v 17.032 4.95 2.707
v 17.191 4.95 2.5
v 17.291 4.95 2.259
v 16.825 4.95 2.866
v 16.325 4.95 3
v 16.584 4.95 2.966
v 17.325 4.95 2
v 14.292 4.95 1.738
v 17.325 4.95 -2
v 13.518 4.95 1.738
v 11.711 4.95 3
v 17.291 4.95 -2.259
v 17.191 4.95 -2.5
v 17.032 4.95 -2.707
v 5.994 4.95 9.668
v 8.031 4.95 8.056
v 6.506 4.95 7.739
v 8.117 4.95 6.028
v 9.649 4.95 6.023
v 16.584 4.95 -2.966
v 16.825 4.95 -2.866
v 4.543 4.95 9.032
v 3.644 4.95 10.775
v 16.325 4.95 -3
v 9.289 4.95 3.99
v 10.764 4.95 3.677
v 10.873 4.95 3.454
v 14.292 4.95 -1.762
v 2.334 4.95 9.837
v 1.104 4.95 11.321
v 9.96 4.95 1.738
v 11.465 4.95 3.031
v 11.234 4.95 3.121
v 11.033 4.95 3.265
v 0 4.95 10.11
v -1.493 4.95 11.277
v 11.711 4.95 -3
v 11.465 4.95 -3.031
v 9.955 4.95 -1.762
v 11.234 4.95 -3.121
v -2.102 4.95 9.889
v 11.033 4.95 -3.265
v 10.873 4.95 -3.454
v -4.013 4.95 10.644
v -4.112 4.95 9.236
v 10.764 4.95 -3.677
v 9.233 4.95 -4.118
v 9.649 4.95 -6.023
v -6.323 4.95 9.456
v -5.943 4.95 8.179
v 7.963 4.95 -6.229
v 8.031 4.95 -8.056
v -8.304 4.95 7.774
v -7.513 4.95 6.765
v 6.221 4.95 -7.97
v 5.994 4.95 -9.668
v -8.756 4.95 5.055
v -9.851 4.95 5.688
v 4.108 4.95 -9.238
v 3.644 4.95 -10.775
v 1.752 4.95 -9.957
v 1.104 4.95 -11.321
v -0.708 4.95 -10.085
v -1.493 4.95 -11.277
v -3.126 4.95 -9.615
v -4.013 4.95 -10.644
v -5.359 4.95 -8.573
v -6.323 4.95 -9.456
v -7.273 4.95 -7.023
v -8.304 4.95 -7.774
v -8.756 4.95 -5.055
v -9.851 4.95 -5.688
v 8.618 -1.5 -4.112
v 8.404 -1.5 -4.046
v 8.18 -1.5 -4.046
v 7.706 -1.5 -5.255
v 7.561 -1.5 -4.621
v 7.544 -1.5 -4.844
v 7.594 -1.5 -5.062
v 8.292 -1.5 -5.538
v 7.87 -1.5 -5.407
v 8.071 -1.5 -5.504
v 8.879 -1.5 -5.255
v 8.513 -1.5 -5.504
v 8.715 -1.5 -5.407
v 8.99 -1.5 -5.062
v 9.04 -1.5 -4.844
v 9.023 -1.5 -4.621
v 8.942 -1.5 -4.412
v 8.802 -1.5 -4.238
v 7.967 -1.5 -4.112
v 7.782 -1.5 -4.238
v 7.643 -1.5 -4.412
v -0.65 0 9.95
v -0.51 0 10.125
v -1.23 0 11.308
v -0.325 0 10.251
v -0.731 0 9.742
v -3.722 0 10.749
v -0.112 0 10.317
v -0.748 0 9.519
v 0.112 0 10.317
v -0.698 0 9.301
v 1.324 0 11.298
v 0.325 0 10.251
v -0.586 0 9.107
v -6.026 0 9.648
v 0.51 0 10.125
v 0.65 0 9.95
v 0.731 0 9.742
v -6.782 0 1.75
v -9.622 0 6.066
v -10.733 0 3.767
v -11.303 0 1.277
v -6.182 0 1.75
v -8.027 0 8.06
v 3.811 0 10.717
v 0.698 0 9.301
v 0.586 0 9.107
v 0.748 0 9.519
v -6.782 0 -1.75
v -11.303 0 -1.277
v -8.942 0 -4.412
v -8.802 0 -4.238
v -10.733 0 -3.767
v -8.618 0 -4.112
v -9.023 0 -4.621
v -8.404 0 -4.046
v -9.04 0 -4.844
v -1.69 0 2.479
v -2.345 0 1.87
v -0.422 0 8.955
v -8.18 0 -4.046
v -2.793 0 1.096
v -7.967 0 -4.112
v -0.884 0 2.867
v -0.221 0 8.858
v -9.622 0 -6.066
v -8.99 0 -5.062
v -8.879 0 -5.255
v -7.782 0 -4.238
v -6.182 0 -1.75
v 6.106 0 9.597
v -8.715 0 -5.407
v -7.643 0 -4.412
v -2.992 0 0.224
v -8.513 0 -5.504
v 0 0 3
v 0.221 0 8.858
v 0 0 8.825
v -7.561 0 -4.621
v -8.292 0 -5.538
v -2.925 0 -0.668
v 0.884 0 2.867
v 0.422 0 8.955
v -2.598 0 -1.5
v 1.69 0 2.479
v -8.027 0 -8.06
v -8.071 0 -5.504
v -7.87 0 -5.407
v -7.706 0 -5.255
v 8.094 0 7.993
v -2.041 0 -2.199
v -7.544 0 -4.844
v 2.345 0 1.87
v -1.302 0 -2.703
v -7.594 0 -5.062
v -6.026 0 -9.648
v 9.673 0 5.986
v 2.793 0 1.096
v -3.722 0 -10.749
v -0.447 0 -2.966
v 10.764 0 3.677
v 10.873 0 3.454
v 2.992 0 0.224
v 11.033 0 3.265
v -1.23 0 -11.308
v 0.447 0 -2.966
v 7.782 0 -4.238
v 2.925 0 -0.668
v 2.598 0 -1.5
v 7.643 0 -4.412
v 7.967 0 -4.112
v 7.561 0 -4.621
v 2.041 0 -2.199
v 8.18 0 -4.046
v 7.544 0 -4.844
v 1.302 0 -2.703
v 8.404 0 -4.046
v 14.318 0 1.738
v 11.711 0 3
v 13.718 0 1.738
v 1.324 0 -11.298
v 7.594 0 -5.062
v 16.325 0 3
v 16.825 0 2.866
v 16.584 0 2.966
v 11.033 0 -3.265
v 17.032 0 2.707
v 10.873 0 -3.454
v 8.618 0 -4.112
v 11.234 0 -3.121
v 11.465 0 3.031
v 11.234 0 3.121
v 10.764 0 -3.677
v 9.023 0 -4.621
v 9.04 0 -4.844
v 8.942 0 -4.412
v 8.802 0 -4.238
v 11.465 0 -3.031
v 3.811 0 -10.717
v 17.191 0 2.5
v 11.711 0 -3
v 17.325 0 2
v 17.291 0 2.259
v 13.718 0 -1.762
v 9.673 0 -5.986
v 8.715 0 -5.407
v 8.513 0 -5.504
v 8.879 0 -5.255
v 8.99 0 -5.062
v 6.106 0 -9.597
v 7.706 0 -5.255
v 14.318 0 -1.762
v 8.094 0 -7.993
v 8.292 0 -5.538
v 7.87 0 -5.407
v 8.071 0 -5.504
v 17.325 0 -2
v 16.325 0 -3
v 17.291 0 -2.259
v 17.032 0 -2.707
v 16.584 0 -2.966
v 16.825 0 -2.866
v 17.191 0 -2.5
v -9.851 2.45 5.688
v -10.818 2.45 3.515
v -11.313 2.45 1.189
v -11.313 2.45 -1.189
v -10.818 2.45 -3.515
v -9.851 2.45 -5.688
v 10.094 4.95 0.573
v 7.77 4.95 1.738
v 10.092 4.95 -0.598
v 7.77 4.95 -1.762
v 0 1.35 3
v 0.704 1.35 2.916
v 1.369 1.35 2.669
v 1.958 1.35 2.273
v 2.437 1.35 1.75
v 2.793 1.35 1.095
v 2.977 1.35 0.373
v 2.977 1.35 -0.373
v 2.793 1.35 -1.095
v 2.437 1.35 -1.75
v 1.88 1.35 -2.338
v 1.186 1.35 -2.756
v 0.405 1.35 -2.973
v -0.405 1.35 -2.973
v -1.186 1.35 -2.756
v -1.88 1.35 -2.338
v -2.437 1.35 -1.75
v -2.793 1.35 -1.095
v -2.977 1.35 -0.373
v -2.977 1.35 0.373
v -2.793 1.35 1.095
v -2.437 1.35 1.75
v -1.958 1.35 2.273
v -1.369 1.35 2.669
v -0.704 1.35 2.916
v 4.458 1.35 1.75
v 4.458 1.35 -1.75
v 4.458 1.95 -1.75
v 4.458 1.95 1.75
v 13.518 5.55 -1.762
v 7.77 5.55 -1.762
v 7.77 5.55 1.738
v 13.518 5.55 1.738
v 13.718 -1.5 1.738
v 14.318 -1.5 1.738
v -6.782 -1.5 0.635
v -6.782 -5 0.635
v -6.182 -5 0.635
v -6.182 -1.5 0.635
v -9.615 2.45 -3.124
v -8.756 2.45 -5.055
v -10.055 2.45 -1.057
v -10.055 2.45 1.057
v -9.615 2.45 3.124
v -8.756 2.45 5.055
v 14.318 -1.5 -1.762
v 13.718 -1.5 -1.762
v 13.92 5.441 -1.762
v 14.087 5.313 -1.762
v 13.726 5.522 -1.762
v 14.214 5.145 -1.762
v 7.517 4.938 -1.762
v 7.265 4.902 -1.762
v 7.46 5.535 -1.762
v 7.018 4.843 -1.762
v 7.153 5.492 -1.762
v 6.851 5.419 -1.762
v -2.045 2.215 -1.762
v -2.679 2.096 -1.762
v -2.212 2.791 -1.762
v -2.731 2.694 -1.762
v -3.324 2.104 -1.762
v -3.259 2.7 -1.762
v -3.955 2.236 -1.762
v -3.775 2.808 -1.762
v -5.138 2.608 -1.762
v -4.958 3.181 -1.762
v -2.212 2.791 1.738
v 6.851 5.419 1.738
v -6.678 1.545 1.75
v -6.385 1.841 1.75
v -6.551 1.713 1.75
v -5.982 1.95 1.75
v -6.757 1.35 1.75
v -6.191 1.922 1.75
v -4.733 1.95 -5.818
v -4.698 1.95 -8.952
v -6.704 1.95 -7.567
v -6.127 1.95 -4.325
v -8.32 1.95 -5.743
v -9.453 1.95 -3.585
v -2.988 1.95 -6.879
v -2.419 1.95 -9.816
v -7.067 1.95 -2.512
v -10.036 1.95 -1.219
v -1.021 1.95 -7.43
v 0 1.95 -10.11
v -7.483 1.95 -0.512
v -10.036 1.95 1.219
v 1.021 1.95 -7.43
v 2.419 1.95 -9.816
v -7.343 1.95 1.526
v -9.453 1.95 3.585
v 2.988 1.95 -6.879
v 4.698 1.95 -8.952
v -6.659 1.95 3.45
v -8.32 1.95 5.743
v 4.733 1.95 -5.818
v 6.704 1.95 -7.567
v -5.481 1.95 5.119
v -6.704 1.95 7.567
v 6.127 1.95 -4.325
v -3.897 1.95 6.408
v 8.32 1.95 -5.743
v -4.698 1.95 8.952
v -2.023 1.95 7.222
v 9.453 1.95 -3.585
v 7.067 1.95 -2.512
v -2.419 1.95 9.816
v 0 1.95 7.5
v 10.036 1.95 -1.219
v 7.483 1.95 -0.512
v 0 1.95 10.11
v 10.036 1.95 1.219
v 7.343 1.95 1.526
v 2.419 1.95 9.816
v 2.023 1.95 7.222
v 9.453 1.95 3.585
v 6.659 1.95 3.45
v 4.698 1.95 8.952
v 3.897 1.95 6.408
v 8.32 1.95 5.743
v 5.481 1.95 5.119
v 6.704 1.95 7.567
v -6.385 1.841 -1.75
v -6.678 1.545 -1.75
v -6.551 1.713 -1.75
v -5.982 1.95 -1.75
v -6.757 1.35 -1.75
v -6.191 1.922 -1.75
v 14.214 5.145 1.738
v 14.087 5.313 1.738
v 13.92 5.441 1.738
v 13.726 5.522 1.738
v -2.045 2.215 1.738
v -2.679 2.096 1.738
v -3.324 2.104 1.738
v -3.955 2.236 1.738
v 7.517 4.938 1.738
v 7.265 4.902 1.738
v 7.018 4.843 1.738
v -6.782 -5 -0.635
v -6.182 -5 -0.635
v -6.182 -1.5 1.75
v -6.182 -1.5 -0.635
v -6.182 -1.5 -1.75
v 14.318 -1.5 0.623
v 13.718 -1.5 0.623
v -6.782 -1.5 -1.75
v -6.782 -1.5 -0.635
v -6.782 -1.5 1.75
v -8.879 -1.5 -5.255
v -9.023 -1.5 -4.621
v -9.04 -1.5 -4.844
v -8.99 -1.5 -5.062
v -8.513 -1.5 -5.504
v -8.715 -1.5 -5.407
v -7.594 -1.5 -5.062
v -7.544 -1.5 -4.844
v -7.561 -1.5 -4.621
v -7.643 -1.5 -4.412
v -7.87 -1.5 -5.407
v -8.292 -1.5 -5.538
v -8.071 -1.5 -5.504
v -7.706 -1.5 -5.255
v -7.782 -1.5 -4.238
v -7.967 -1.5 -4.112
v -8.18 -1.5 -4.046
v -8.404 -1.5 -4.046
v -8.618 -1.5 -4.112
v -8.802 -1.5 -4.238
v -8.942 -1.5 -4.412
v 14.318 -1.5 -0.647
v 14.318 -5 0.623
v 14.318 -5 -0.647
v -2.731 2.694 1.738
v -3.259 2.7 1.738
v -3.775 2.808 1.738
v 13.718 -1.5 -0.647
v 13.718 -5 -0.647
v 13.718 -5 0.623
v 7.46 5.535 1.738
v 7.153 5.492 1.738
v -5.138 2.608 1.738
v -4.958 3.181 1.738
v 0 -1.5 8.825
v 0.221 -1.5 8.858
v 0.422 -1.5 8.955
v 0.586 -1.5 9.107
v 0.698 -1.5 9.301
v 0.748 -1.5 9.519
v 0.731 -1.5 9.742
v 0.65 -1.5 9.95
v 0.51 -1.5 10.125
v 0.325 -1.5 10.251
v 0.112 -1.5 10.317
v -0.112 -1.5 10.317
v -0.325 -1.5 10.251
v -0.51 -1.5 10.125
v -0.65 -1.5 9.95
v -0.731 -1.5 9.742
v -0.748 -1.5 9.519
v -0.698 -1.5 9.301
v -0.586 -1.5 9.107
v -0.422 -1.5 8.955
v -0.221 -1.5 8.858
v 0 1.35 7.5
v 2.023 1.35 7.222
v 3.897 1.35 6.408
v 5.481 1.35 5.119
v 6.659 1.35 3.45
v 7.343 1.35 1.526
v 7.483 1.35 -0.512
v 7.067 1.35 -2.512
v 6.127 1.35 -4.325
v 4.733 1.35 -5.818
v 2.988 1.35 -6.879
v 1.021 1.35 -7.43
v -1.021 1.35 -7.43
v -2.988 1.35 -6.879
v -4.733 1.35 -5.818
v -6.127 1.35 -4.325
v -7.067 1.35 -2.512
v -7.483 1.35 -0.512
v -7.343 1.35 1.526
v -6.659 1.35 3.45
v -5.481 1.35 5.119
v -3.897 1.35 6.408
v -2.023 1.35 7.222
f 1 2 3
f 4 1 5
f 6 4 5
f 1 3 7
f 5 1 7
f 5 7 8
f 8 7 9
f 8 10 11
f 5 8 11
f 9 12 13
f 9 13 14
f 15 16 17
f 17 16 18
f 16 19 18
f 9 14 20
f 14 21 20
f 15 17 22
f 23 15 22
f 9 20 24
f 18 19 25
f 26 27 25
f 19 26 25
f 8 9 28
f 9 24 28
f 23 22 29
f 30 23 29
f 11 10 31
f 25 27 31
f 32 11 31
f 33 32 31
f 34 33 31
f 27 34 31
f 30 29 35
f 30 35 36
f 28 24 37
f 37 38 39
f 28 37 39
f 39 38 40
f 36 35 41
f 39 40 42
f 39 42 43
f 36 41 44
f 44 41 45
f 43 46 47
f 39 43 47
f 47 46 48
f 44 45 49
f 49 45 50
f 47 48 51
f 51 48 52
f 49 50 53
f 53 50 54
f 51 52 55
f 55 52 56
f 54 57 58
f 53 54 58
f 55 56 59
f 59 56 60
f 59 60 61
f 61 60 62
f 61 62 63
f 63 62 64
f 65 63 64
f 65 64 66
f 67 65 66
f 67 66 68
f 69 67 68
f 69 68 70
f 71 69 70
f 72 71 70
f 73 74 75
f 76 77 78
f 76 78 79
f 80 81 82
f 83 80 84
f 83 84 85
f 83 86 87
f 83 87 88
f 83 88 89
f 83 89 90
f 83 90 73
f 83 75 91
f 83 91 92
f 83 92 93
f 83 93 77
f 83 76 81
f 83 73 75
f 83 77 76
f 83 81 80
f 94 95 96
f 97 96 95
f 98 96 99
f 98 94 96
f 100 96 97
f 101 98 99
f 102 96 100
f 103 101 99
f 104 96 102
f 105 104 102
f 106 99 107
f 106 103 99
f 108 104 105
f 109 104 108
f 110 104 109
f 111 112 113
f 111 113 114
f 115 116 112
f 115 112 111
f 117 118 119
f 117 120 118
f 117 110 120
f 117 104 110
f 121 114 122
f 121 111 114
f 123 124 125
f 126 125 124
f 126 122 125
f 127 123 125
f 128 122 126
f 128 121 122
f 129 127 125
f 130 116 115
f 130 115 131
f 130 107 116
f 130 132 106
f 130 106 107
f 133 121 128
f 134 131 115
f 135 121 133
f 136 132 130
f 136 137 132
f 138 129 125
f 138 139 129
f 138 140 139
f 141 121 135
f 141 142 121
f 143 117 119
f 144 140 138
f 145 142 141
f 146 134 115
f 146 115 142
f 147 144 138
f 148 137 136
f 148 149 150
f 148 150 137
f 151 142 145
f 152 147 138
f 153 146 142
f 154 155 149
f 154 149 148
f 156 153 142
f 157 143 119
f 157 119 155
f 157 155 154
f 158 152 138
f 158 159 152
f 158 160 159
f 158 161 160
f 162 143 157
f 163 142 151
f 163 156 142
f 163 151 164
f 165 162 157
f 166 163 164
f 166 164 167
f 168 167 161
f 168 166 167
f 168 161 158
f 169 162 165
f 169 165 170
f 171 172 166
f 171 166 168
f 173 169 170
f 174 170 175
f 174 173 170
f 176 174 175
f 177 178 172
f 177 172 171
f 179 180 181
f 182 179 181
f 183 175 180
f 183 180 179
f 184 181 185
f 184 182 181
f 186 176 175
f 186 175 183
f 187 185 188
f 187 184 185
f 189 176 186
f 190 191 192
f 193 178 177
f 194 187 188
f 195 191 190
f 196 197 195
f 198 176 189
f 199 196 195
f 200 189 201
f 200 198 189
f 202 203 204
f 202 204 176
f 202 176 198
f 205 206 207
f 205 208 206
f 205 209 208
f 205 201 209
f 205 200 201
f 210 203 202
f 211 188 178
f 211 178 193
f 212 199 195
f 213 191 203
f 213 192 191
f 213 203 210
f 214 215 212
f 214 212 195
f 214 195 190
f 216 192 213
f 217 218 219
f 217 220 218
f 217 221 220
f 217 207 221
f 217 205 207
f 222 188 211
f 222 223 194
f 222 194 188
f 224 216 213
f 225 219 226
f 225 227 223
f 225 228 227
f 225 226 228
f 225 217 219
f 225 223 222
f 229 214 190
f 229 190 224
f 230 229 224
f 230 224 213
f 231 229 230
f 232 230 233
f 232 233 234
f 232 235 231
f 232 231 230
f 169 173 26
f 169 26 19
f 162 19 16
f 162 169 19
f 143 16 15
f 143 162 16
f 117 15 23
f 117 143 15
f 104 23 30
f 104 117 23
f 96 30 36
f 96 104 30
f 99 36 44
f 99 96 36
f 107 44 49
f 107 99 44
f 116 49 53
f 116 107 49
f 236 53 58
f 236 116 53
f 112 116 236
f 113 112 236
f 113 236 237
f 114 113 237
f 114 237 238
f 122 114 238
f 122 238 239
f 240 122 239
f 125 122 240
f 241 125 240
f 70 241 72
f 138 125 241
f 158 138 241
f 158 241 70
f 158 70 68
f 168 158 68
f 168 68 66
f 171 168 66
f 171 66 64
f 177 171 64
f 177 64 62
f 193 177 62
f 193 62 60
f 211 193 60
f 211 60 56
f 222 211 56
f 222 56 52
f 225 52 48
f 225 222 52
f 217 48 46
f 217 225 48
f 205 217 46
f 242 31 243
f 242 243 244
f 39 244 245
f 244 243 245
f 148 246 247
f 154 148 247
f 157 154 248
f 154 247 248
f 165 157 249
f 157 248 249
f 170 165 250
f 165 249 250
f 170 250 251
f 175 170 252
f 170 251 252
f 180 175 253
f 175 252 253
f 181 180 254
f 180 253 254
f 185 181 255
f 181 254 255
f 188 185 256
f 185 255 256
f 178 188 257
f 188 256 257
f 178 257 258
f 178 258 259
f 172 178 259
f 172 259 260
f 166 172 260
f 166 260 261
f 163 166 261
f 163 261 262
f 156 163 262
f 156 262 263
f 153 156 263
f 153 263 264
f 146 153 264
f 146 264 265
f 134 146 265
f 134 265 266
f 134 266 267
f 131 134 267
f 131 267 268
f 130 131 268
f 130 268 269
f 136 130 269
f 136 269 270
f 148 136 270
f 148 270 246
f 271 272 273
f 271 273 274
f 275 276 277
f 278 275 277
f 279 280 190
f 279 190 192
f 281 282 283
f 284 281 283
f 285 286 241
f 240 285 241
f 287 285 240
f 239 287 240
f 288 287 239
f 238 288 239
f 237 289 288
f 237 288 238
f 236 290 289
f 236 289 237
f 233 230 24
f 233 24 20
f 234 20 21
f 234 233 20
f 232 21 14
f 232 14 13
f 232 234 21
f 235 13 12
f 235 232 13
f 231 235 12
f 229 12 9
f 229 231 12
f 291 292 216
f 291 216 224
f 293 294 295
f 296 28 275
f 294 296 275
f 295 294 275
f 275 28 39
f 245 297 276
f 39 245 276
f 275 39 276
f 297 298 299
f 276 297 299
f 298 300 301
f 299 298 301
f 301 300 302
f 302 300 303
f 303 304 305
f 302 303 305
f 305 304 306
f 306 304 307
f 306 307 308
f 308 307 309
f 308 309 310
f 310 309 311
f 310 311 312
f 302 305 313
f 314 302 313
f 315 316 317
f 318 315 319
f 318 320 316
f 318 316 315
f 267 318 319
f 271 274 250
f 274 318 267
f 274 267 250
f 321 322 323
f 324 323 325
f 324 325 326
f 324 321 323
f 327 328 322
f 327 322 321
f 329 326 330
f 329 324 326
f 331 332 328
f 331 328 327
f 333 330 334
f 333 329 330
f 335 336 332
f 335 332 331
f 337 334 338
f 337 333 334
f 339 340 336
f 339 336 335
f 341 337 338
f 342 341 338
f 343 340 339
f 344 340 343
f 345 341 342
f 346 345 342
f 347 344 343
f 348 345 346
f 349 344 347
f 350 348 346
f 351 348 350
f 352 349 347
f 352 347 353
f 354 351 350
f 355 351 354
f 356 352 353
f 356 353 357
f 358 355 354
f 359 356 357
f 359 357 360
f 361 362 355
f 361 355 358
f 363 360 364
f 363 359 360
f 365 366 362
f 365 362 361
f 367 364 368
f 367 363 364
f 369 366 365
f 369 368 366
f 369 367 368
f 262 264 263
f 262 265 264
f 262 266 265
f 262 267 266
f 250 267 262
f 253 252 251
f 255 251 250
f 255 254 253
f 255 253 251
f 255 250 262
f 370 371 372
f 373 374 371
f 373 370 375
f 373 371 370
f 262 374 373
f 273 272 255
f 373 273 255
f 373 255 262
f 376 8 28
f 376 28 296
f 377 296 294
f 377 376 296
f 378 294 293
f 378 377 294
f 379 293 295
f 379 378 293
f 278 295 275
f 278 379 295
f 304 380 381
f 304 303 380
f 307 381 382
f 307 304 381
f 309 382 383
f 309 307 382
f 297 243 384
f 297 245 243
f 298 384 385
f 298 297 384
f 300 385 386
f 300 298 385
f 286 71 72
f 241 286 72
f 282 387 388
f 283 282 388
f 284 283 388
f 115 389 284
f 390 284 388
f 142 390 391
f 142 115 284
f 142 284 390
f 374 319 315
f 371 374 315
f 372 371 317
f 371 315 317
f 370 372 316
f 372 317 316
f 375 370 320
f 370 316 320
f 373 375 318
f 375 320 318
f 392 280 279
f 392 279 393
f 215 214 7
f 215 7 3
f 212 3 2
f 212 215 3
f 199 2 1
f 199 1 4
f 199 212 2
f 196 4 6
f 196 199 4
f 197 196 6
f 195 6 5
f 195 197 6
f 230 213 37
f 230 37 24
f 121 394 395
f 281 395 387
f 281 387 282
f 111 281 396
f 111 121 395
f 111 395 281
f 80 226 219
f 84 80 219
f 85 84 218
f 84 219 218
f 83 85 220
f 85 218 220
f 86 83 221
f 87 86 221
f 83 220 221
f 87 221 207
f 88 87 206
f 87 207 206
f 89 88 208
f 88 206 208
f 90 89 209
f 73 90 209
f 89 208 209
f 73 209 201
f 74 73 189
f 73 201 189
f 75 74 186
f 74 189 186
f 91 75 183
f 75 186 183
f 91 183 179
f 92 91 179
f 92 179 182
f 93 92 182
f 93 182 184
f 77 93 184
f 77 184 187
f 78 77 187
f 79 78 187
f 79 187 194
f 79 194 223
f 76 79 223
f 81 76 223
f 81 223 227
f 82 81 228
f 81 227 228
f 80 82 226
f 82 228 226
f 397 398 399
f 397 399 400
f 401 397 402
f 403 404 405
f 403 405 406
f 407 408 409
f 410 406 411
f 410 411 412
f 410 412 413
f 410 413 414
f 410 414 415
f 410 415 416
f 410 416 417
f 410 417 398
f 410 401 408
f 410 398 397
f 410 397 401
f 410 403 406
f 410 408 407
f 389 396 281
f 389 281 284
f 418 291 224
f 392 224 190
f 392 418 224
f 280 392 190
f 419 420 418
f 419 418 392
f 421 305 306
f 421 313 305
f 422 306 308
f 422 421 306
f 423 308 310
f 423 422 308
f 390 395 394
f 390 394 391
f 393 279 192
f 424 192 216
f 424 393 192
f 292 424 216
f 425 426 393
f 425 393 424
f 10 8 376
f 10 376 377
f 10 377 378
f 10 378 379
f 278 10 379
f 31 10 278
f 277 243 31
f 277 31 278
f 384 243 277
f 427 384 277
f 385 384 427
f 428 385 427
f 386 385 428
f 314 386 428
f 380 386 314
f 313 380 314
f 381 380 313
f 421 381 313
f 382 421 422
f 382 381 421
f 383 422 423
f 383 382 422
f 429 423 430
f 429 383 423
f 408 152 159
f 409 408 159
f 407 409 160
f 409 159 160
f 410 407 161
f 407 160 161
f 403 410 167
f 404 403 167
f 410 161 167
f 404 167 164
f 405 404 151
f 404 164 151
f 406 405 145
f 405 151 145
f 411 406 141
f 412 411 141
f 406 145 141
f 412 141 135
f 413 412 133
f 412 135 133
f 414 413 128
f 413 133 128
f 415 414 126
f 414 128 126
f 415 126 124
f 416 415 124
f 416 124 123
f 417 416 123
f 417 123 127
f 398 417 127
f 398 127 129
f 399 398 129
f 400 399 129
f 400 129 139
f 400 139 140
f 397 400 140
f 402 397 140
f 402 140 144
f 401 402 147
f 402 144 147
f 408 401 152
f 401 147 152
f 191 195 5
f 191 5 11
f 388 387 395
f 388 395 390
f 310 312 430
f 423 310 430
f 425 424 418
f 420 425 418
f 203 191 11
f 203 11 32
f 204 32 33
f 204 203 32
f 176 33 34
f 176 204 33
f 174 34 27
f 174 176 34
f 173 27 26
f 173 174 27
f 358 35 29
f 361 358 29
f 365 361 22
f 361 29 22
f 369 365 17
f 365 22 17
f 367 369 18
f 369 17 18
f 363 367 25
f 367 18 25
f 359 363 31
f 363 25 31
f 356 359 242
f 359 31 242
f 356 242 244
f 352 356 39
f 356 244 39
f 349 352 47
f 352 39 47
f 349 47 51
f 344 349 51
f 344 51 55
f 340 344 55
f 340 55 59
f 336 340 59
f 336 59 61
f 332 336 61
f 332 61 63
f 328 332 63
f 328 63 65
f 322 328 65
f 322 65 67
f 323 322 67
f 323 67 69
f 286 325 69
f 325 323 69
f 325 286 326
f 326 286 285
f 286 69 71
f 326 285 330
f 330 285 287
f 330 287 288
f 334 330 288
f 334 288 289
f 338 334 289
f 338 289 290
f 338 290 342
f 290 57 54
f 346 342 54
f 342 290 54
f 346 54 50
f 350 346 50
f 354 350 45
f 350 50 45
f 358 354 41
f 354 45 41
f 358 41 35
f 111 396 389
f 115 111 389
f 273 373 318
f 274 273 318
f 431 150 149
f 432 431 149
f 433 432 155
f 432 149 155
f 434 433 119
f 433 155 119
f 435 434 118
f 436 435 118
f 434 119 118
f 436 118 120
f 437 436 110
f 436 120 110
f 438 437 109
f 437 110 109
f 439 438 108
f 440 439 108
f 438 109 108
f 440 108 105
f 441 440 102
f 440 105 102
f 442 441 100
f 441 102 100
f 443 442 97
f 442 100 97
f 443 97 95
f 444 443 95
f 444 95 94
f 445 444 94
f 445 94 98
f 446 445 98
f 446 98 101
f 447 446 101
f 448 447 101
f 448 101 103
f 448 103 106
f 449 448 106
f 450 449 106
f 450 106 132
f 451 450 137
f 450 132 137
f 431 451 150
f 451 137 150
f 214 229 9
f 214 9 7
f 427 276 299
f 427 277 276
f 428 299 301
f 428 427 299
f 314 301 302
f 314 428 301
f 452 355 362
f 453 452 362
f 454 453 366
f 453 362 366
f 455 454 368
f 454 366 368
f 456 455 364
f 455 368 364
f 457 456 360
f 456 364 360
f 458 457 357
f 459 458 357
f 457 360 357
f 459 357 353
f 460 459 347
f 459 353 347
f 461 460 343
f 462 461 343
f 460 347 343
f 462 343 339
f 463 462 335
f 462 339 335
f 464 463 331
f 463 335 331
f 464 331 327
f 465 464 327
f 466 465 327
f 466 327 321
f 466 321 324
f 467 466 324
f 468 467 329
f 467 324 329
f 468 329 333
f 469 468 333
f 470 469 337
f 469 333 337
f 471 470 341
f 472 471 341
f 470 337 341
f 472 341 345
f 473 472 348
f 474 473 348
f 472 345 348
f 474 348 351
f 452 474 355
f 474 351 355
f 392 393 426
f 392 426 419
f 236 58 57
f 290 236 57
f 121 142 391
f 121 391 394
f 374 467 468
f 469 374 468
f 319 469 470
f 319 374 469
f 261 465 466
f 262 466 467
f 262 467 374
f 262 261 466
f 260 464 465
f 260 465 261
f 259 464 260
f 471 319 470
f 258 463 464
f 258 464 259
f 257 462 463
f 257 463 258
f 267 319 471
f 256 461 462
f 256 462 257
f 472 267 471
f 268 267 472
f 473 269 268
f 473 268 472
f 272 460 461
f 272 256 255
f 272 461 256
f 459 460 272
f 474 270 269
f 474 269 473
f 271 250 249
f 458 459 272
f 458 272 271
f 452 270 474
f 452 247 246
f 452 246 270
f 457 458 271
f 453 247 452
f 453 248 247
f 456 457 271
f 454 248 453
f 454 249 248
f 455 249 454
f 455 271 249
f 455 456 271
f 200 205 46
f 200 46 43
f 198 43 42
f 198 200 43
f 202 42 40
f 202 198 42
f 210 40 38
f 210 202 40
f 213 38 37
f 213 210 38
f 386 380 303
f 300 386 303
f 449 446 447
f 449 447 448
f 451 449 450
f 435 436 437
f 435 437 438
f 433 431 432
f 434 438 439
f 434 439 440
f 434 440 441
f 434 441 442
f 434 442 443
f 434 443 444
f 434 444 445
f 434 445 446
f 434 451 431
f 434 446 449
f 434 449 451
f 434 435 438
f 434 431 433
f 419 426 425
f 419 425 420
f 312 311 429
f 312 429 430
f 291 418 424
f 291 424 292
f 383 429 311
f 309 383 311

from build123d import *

# Parameters (mm, degrees)
EXTRUDE_1_DEPTH     = 4.95
SKETCH_2_R          = 10.11
CUT_EXTRUDE_1_DEPTH = 3
CUT_EXTRUDE_2_DEPTH = 2.5
SKETCH_4_R          = 7.5
CUT_EXTRUDE_3_DEPTH = 0.6
CUT_EXTRUDE_4_REACH = 23.036
SKETCH_5_R          = 3
SKETCH_8_W          = 3.5
SKETCH_8_H          = 0.6
SKETCH_9_R          = 0.75
EXTRUDE_2_DEPTH     = 1.5
SKETCH_10_W         = 0.6
SKETCH_10_H         = 1.115
CUT_EXTRUDE_5_DEPTH = 3.5
SKETCH_16_W         = 0.6
SKETCH_16_H         = 1.27
EXTRUDE_3_DEPTH     = 3.5


with BuildPart() as part:
    # Эскиз1 → Вытянуть1 (new body)
    with BuildSketch(Plane(origin=(0, 0, 0), x_dir=(1, 0, 0), z_dir=(0, 1, 0))):
        with BuildLine():
            Line((11.710705572, 3), (16.325, 3))
            ThreePointArc((16.325, 3), (17.032106781, 2.707106781), (17.325, 2))
            Line((17.325, 2), (17.325, -2))
            ThreePointArc((17.325, -2), (17.032106781, -2.707106781), (16.325, -3))
            Line((16.325, -3), (11.710705572, -3))
            ThreePointArc((11.710705572, -3), (11.128997881, -3.186602089), (10.76438593, -3.676767677))
            ThreePointArc((10.76438593, -3.676767677), (-11.375, 0), (10.76438593, 3.676767677))
            ThreePointArc((10.76438593, 3.676767677), (11.128997881, 3.186602089), (11.710705572, 3))
        make_face()
    extrude(amount=EXTRUDE_1_DEPTH)

    # Эскиз2 → Вырез-Вытянуть1 (cut)
    with BuildSketch(Plane(origin=(0, 4.95, 0), x_dir=(-1, 0, 0), z_dir=(0, 1, 0))):
        Circle(SKETCH_2_R)
    extrude(amount=-CUT_EXTRUDE_1_DEPTH, mode=Mode.SUBTRACT)

    # Эскиз3 → Вырез-Вытянуть2 (cut)
    with BuildSketch(Plane(origin=(0, 4.95, 0), x_dir=(-1, 0, 0), z_dir=(0, 1, 0))):
        with BuildLine():
            Line((8.755516832, -5.055), (9.851038968, -5.6875))
            ThreePointArc((9.851038968, -5.6875), (11.375, 0), (9.851038968, 5.6875))
            Line((9.851038968, 5.6875), (8.755516832, 5.055))
            ThreePointArc((8.755516832, 5.055), (10.11, 0), (8.755516832, -5.055))
        make_face()
    extrude(amount=-CUT_EXTRUDE_2_DEPTH, mode=Mode.SUBTRACT)

    # Эскиз4 → Вырез-Вытянуть3 (cut)
    with BuildSketch(Plane(origin=(0, 1.95, 0), x_dir=(-1, 0, 0), z_dir=(0, 1, 0))):
        Circle(SKETCH_4_R)
    extrude(amount=-CUT_EXTRUDE_3_DEPTH, mode=Mode.SUBTRACT)

    # Эскиз5 → Вырез-Вытянуть4 (cut, up to next)
    with BuildSketch(Plane(origin=(0, 1.35, 0), x_dir=(-1, 0, 0), z_dir=(0, 1, 0)), mode=Mode.PRIVATE) as cut_extrude_4_sk1:
        Circle(SKETCH_5_R)
    cut_extrude_4_tool1 = extrude(cut_extrude_4_sk1.sketch, amount=-CUT_EXTRUDE_4_REACH, mode=Mode.PRIVATE) & part.part
    add(cut_extrude_4_tool1.solids().sort_by_distance((0, 1.35, 0))[0], mode=Mode.SUBTRACT)

    # По траектории2: sweep along a path in Эскиз7
    with BuildLine(Plane.XY) as sweep_2_path:
        Line((-6.482147214, -5), (-6.482147214, 1.15))
        ThreePointArc((-6.482147214, 1.15), (-6.335700604, 1.503553391), (-5.982147214, 1.65))
        Line((-5.982147214, 1.65), (4.458438225, 1.65))
    # Эскиз8 → По траектории2 (sweep)
    with BuildSketch(Plane(origin=(4.458438225, 0, 0), x_dir=(0, 0, -1), z_dir=(1, 0, 0))):
        with Locations((0, 1.65)):
            Rectangle(SKETCH_8_W, SKETCH_8_H)
    sweep(path=sweep_2_path.line)

    # Эскиз9 → Вытянуть2 (add)
    with BuildSketch(Plane.XZ):
        with Locations((0, 9.575)):
            Circle(SKETCH_9_R)
        with Locations((8.292193241, -4.7875)):
            Circle(SKETCH_9_R)
        with Locations((-8.292193241, -4.7875)):
            Circle(SKETCH_9_R)
    extrude(amount=EXTRUDE_2_DEPTH)

    # Эскиз10 → Вырез-Вытянуть5 (cut)
    with BuildSketch(Plane.XZ.offset(5)):
        with Locations((-6.482147214, 1.1925)):
            Rectangle(SKETCH_10_W, SKETCH_10_H)
        with Locations((-6.482147214, -1.1925)):
            Rectangle(SKETCH_10_W, SKETCH_10_H)
    extrude(amount=-CUT_EXTRUDE_5_DEPTH, mode=Mode.SUBTRACT)

    # По траектории3: sweep along a path in Эскиз12
    with BuildLine(Plane.XY) as sweep_3_path:
        Line((14.017852786, 0), (14.017852786, 4.75))
        ThreePointArc((14.017852786, 4.75), (13.871406177, 5.103553391), (13.517852786, 5.25))
        Line((13.517852786, 5.25), (7.770329112, 5.25))
        ThreePointArc((7.770329112, 5.25), (7.348318318, 5.220169505), (6.934700052, 5.13127126))
        Line((6.934700052, 5.13127126), (-2.128848466, 2.502652205))
        ThreePointArc((-2.128848466, 2.502652205), (-2.998479817, 2.384116164), (-3.865200914, 2.522333456))
        Line((-3.865200914, 2.522333456), (-5.047739274, 2.89455308))
    # Эскиз14 → По траектории3 (sweep)
    with BuildSketch(Plane.XZ):
        Polygon((14.317852786, -1.76229338), (14.317852786, 1.73770662), (14.017852786, 1.73770662), (13.717852786, 1.73770662), (13.717852786, -1.76229338), (14.017852786, -1.76229338), align=None)
    sweep(path=sweep_3_path.line)

    # По траектории4: sweep along a path in Эскиз15
    with BuildLine(Plane.XY) as sweep_4_path:
        Line((14.017852786, 0), (14.017852786, -1.5))
    # Эскиз14<3> → По траектории4 (sweep)
    with BuildSketch(Plane.XZ):
        Polygon((14.317852786, -1.76229338), (14.317852786, 1.73770662), (14.017852786, 1.73770662), (13.717852786, 1.73770662), (13.717852786, -1.76229338), (14.017852786, -1.76229338), align=None)
    sweep(path=sweep_4_path.line)

    # Эскиз16 → Вытянуть3 (add)
    with BuildSketch(Plane.XZ.offset(1.5)):
        with Locations((14.017852786, -0.01229338)):
            Rectangle(SKETCH_16_W, SKETCH_16_H)
    extrude(amount=EXTRUDE_3_DEPTH)


solid = part.part
